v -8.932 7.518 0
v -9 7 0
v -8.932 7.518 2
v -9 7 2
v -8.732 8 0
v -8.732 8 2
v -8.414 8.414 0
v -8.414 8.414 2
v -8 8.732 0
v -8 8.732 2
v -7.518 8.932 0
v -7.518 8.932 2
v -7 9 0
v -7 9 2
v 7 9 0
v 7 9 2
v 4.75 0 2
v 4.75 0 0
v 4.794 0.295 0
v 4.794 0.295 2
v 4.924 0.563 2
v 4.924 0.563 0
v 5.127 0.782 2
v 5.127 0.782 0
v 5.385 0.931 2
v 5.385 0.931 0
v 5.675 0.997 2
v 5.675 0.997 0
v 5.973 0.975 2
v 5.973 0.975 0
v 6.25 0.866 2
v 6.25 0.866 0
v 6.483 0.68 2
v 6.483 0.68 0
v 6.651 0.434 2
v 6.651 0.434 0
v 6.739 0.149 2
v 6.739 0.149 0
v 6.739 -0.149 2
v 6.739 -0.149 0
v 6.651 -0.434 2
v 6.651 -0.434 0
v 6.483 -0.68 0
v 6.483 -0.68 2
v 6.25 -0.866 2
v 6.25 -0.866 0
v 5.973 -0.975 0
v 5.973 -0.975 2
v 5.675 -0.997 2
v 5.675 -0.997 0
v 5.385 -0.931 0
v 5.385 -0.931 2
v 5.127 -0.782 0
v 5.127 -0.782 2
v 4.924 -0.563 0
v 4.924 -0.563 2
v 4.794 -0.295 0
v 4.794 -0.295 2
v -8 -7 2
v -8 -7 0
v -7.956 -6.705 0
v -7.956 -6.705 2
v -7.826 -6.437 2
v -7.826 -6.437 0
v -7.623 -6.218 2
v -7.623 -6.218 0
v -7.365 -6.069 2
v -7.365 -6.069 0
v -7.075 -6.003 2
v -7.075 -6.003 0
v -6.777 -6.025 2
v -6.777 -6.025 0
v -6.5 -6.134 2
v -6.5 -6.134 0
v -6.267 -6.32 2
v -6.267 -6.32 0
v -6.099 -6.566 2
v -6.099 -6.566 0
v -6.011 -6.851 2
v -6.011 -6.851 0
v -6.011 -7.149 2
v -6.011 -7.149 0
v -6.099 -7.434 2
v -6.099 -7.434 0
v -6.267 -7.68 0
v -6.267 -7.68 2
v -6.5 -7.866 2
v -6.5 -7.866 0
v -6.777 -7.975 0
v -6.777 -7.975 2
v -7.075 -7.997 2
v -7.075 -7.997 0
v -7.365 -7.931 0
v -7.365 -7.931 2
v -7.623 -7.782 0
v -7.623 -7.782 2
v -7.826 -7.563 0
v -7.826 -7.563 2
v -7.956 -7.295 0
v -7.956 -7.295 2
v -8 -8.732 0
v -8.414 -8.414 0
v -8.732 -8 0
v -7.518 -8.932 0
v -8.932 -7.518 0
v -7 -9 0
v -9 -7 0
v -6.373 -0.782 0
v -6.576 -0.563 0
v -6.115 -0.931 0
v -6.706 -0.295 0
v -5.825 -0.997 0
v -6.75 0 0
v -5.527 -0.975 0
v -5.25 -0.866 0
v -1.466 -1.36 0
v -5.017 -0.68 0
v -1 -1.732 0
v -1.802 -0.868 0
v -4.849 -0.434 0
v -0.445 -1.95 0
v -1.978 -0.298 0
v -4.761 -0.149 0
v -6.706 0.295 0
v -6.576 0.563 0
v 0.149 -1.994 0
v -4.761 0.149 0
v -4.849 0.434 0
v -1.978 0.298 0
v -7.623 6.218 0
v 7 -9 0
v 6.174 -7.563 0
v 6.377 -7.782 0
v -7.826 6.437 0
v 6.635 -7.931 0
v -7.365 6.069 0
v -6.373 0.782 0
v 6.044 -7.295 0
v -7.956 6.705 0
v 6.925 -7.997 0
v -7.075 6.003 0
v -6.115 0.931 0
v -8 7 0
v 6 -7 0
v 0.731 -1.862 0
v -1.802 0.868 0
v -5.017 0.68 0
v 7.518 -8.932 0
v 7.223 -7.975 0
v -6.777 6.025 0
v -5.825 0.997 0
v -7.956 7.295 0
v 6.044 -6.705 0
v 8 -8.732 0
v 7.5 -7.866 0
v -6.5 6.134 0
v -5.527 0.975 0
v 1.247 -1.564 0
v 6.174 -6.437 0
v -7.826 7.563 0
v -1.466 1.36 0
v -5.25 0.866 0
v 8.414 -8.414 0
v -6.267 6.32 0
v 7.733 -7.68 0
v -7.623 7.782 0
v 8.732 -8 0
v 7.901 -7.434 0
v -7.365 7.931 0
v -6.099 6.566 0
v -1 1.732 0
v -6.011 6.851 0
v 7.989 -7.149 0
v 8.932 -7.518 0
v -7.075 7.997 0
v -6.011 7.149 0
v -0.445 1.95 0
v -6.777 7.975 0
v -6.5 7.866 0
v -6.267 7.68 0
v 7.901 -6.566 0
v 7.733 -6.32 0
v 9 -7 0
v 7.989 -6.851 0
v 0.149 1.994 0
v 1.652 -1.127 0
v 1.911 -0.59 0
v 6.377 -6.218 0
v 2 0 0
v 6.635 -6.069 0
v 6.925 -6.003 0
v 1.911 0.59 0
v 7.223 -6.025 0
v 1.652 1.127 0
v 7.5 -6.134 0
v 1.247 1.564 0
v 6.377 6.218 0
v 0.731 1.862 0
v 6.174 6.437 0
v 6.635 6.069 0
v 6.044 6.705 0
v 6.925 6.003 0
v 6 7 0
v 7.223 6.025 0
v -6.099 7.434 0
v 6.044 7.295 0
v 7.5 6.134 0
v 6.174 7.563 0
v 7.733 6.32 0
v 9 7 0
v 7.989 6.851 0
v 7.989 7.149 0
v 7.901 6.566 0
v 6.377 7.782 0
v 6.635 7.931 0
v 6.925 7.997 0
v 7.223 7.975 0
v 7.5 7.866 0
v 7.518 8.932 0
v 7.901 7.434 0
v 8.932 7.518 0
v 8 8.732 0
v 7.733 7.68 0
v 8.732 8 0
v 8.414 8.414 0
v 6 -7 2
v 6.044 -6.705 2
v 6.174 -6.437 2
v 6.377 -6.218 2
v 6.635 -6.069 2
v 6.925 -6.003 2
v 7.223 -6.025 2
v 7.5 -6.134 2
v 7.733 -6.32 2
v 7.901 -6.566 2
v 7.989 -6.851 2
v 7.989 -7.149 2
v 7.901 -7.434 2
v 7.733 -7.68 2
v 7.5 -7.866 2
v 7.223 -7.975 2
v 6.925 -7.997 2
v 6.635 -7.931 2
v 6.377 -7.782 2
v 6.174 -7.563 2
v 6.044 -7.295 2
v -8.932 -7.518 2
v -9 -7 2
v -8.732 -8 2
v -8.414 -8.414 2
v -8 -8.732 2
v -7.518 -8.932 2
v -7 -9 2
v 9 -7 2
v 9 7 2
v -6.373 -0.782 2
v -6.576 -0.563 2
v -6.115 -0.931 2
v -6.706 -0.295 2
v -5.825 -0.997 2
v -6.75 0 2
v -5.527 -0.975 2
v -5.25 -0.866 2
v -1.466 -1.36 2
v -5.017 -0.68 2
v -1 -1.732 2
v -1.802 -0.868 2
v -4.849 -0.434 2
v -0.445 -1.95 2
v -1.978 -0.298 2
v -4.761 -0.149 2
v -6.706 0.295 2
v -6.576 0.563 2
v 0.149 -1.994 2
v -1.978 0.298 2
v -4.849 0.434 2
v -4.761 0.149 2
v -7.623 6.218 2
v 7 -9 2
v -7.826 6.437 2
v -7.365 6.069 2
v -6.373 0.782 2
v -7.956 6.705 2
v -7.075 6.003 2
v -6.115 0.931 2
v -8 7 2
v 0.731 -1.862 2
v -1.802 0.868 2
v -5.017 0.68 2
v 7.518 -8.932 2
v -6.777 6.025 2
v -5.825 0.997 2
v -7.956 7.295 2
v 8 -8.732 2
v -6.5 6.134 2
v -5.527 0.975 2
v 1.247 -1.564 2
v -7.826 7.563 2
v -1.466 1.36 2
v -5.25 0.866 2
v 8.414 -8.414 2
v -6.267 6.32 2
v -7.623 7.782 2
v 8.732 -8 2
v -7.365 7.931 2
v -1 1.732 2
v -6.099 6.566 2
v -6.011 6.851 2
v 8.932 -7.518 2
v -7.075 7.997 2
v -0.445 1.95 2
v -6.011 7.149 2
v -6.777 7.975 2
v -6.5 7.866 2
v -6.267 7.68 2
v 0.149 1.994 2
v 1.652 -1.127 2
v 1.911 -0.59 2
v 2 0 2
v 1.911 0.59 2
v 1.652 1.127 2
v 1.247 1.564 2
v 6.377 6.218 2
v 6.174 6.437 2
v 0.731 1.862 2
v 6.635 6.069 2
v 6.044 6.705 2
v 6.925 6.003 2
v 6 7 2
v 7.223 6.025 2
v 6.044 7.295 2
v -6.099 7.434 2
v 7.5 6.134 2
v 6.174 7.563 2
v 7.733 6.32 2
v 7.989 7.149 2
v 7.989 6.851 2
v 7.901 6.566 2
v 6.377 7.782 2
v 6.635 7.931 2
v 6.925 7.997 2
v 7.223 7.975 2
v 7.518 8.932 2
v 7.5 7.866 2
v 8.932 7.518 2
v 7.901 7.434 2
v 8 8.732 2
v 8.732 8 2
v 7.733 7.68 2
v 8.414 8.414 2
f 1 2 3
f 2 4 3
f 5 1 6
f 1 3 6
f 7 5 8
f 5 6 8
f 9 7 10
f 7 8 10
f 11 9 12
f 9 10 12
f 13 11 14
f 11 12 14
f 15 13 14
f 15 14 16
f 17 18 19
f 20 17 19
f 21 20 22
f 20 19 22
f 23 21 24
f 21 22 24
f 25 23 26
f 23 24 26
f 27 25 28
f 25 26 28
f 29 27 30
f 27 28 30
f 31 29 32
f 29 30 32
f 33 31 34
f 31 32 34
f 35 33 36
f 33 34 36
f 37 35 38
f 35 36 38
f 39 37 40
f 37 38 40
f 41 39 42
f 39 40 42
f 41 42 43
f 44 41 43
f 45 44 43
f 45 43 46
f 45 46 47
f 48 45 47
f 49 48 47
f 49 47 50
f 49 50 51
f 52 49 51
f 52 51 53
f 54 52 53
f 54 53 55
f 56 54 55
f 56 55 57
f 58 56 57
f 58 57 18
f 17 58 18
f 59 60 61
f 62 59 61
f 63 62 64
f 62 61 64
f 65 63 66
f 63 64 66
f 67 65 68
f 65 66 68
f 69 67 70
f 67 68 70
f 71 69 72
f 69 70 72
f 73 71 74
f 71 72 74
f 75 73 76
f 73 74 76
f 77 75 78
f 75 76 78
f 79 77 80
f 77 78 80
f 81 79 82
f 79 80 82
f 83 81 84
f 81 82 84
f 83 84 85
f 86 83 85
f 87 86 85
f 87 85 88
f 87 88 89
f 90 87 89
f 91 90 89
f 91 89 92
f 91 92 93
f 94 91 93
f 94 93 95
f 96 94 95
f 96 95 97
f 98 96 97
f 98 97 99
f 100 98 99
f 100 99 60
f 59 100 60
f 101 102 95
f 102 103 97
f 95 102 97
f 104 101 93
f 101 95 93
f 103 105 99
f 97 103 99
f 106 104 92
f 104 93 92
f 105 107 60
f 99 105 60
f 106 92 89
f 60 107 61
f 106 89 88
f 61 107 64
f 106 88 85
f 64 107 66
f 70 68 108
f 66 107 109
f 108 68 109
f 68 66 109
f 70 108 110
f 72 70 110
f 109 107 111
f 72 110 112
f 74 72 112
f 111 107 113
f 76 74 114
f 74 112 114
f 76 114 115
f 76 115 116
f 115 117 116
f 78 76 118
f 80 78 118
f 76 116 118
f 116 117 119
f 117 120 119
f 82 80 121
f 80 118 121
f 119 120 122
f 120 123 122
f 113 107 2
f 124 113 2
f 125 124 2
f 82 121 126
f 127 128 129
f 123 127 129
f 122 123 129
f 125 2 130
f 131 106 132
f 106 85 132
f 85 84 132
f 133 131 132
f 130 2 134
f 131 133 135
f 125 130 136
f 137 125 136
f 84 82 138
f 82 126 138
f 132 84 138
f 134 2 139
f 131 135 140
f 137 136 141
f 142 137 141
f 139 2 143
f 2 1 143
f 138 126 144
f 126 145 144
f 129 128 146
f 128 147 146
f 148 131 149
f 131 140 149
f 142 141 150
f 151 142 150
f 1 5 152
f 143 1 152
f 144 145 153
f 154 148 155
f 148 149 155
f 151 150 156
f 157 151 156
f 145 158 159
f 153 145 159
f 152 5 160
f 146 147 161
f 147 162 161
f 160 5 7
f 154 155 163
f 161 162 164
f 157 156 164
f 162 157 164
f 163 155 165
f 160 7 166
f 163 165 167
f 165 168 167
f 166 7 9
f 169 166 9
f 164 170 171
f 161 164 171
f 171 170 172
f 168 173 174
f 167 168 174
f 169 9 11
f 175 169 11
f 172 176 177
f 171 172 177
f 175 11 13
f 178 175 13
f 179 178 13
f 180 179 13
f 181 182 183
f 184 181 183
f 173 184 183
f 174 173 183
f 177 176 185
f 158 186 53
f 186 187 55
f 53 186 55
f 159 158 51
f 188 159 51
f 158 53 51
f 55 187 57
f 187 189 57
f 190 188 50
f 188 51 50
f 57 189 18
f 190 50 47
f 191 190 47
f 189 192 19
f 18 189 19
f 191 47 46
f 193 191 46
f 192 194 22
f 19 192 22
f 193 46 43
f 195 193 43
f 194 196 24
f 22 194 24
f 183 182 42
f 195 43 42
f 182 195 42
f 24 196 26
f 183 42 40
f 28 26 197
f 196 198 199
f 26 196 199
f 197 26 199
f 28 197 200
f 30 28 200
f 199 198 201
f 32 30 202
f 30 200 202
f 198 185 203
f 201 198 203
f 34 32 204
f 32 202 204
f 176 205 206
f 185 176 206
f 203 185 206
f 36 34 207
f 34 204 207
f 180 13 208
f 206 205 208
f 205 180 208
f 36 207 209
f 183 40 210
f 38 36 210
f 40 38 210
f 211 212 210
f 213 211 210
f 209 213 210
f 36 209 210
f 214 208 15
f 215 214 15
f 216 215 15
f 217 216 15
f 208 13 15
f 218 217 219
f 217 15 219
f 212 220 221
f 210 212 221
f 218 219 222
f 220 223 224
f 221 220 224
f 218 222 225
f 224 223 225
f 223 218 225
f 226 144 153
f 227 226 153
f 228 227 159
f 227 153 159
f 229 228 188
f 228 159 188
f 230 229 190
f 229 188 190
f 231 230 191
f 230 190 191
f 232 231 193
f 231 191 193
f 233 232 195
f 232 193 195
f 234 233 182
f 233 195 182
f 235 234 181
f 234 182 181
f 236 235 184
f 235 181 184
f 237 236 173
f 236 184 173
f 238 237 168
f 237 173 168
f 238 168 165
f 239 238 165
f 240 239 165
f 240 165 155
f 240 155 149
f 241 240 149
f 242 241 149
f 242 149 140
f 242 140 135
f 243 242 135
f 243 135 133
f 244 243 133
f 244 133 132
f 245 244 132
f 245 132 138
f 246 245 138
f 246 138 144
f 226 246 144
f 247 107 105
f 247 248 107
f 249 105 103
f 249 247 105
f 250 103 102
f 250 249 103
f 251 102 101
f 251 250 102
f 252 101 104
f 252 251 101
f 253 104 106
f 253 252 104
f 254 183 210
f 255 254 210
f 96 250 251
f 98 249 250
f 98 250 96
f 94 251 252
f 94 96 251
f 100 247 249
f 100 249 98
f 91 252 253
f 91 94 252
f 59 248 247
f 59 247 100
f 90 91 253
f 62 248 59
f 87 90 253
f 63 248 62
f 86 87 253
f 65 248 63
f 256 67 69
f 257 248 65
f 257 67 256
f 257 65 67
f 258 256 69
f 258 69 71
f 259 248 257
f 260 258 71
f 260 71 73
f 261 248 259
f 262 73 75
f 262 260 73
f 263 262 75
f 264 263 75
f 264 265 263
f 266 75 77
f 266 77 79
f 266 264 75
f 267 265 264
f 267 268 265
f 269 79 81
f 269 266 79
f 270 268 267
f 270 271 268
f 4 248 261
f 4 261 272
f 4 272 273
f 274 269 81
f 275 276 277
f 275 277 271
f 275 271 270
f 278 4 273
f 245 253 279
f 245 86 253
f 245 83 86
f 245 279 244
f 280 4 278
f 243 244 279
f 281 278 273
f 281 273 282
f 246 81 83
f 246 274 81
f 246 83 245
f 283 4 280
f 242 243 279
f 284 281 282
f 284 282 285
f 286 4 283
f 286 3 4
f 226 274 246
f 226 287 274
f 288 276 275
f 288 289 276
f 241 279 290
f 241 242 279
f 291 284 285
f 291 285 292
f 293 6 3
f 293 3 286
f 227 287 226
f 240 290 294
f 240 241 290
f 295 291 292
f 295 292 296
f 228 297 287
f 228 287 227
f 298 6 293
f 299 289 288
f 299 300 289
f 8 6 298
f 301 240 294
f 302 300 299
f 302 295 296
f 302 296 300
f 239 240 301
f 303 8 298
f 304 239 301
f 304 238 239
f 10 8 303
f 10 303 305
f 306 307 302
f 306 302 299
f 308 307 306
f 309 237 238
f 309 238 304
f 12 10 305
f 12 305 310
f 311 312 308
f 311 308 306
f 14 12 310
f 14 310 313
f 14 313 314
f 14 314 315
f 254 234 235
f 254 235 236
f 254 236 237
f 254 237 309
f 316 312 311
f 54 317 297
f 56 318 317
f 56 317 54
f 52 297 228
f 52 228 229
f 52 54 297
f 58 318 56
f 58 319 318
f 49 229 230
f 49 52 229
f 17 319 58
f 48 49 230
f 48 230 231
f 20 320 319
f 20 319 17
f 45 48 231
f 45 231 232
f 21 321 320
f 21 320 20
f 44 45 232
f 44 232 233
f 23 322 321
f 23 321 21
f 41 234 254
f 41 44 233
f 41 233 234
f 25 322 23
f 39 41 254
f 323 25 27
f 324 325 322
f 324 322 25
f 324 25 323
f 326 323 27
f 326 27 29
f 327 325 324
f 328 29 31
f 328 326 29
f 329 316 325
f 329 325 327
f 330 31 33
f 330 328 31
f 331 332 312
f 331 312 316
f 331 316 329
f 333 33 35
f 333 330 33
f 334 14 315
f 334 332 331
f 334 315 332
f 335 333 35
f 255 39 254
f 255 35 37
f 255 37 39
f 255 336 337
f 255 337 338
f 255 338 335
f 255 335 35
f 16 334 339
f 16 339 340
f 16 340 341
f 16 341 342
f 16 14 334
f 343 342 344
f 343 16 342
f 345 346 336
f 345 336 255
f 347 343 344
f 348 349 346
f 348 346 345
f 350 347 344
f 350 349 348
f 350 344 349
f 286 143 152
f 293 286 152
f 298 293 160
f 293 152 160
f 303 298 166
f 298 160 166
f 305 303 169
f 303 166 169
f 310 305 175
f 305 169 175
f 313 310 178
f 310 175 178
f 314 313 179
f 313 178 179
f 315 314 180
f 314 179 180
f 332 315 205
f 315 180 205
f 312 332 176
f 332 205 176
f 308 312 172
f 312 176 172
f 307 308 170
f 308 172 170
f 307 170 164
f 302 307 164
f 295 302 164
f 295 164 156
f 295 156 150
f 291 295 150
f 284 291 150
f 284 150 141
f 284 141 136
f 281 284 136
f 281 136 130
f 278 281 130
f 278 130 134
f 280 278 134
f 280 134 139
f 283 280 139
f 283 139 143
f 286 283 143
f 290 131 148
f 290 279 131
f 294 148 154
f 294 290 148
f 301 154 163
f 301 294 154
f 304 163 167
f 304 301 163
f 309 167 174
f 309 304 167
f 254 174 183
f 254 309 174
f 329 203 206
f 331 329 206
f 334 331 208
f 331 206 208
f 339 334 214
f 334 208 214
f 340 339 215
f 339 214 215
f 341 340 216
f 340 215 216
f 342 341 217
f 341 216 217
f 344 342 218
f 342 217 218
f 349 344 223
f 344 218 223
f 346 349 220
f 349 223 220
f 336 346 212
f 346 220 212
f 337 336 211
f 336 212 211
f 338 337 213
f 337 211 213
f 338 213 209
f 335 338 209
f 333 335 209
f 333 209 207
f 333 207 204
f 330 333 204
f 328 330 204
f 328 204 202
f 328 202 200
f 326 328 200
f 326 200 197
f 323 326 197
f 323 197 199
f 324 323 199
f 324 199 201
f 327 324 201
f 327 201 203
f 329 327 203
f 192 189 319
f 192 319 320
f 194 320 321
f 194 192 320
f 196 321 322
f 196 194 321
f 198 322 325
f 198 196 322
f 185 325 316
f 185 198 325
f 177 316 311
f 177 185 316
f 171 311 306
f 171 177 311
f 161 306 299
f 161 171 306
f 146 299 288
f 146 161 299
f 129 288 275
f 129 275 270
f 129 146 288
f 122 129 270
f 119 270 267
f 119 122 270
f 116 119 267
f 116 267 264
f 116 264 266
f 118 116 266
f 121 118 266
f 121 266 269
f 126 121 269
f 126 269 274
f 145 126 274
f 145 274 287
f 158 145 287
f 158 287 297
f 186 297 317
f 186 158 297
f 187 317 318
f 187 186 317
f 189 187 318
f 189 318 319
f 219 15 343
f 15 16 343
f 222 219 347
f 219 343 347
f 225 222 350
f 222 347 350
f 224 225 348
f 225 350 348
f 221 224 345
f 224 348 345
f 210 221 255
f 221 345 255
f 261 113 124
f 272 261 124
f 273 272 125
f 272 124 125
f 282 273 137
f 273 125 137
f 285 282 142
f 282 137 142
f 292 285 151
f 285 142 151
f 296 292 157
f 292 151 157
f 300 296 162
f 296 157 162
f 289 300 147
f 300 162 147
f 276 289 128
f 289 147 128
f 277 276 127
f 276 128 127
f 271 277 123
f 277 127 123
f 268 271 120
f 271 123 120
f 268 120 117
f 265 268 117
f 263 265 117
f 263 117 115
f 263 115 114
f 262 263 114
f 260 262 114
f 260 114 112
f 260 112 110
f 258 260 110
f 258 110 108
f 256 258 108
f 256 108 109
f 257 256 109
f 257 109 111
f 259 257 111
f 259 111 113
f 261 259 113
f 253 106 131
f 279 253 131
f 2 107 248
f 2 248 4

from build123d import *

# Parameters (mm, degrees)
SKETCH_1_W      = 18
SKETCH_1_H      = 18
SKETCH_1_R      = 2
EXTRUDE_1_DEPTH = 2
MM_1_D          = 2
FILLET_1_R      = 2
MM_2_D          = 2


with BuildPart() as part:
    # 草图1 → 凸台-拉伸1 (new body)
    with BuildSketch(Plane.XY):
        Rectangle(SKETCH_1_W, SKETCH_1_H)
        Circle(SKETCH_1_R, mode=Mode.SUBTRACT)
    extrude(amount=EXTRUDE_1_DEPTH)

    # 大小mm 暗销孔1 (through all)
    with Locations(Plane(origin=(-7, 7, 2), x_dir=(1, 0, 0), z_dir=(0, 0, 1))):
        with Locations((0, 0), (14, 0), (14, -14), (0, -14)):
            Hole(MM_1_D / 2)

    # 圆角1
    fillet_1_edges = [part.edges().sort_by_distance(p)[0] for p in [
        (9, -9, 1),
        (-9, -9, 1),
        (-9, 9, 1),
        (9, 9, 1),
    ]]
    fillet(fillet_1_edges, radius=FILLET_1_R)

    # 大小mm 暗销孔2 (through all)
    with Locations(Plane(origin=(-5.75, 0, 2), x_dir=(1, 0, 0), z_dir=(0, 0, 1))):
        with Locations((0, 0), (11.5, 0)):
            Hole(MM_2_D / 2)


solid = part.part
